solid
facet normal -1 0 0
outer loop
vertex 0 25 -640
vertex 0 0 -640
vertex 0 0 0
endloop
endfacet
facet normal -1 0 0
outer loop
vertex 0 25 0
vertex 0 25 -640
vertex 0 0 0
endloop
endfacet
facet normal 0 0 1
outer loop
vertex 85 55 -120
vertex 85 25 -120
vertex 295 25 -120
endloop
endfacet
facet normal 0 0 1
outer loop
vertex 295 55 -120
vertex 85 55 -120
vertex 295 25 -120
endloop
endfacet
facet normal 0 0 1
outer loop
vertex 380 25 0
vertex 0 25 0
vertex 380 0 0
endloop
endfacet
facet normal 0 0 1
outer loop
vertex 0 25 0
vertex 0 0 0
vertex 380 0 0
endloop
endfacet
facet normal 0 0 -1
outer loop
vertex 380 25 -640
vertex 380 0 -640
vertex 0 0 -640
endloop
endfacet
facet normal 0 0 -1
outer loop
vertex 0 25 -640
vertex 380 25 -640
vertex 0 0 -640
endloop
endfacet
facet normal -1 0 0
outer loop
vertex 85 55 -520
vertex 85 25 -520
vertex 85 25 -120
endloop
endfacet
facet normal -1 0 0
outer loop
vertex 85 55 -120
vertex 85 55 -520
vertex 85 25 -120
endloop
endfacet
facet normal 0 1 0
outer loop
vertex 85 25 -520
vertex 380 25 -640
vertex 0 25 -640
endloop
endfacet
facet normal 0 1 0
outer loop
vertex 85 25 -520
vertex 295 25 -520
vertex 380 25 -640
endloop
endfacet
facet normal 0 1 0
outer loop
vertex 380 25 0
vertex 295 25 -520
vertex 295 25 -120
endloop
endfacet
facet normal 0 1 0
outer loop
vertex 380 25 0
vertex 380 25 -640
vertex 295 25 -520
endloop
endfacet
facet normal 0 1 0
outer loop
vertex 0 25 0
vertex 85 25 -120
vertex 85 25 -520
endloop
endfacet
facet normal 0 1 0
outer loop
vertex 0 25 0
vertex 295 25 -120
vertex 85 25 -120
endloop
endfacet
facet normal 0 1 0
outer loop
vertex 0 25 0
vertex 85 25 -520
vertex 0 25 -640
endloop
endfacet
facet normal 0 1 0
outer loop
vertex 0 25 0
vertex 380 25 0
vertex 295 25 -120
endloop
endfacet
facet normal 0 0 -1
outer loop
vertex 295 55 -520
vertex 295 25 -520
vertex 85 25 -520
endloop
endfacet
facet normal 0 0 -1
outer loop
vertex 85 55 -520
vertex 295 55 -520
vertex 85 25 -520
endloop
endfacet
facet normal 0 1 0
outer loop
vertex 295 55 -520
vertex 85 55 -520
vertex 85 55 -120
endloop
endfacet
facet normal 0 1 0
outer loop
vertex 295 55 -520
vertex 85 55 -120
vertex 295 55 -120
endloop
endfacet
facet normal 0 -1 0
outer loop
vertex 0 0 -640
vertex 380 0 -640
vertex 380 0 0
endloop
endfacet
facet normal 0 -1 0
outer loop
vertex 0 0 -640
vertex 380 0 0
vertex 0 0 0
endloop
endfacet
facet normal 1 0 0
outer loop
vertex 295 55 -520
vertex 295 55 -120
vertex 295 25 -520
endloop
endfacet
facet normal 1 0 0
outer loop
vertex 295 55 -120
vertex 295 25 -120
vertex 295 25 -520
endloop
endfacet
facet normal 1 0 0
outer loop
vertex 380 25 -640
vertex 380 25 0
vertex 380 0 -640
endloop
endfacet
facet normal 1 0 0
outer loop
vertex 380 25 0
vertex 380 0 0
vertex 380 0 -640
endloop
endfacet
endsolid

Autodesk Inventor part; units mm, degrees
ref_plane "YZ Plane" through (0, 0, 0) normal (1, 0, 0) x (0, 1, 0)
ref_plane "XZ Plane" through (0, 0, 0) normal (0, 1, 0) x (-1, 0, 0)
ref_plane "XY Plane" through (0, 0, 0) normal (0, 0, 1) x (1, 0, 0)
sketch "Sketch1" plane through (0, 0, 0) normal (0, 1, 0) x (-1, 0, 0)
  line L0 (0, 0) -> (-380, 0)
  line L1 (-380, 0) -> (-380, -640)
  line L2 (-380, -640) -> (0, -640)
  line L3 (0, -640) -> (0, 0)
  dimension "d0" = 380
  dimension "d1" = 640
extrude "Extrusion1" add sketch "Sketch1" along normal blind 25
sketch "Sketch2" plane through (0, 25, 0) normal (0, 1, 0) x (1, 0, 0)
  line L0 (85, 120) -> (295, 120)
  line L1 (295, 120) -> (295, 520)
  line L2 (295, 520) -> (85, 520)
  line L3 (85, 520) -> (85, 120)
  line L4 (0, 640) -> (0, 0) projected
  line L5 (380, 640) -> (0, 640) projected
  dimension "d4" = 210
  dimension "d5" = 400
  dimension "d6" = 85
  dimension "d7" = 120
extrude "Extrusion2" add sketch "Sketch2" along normal blind 30
properties part number "Monitor, back bump not measured"
